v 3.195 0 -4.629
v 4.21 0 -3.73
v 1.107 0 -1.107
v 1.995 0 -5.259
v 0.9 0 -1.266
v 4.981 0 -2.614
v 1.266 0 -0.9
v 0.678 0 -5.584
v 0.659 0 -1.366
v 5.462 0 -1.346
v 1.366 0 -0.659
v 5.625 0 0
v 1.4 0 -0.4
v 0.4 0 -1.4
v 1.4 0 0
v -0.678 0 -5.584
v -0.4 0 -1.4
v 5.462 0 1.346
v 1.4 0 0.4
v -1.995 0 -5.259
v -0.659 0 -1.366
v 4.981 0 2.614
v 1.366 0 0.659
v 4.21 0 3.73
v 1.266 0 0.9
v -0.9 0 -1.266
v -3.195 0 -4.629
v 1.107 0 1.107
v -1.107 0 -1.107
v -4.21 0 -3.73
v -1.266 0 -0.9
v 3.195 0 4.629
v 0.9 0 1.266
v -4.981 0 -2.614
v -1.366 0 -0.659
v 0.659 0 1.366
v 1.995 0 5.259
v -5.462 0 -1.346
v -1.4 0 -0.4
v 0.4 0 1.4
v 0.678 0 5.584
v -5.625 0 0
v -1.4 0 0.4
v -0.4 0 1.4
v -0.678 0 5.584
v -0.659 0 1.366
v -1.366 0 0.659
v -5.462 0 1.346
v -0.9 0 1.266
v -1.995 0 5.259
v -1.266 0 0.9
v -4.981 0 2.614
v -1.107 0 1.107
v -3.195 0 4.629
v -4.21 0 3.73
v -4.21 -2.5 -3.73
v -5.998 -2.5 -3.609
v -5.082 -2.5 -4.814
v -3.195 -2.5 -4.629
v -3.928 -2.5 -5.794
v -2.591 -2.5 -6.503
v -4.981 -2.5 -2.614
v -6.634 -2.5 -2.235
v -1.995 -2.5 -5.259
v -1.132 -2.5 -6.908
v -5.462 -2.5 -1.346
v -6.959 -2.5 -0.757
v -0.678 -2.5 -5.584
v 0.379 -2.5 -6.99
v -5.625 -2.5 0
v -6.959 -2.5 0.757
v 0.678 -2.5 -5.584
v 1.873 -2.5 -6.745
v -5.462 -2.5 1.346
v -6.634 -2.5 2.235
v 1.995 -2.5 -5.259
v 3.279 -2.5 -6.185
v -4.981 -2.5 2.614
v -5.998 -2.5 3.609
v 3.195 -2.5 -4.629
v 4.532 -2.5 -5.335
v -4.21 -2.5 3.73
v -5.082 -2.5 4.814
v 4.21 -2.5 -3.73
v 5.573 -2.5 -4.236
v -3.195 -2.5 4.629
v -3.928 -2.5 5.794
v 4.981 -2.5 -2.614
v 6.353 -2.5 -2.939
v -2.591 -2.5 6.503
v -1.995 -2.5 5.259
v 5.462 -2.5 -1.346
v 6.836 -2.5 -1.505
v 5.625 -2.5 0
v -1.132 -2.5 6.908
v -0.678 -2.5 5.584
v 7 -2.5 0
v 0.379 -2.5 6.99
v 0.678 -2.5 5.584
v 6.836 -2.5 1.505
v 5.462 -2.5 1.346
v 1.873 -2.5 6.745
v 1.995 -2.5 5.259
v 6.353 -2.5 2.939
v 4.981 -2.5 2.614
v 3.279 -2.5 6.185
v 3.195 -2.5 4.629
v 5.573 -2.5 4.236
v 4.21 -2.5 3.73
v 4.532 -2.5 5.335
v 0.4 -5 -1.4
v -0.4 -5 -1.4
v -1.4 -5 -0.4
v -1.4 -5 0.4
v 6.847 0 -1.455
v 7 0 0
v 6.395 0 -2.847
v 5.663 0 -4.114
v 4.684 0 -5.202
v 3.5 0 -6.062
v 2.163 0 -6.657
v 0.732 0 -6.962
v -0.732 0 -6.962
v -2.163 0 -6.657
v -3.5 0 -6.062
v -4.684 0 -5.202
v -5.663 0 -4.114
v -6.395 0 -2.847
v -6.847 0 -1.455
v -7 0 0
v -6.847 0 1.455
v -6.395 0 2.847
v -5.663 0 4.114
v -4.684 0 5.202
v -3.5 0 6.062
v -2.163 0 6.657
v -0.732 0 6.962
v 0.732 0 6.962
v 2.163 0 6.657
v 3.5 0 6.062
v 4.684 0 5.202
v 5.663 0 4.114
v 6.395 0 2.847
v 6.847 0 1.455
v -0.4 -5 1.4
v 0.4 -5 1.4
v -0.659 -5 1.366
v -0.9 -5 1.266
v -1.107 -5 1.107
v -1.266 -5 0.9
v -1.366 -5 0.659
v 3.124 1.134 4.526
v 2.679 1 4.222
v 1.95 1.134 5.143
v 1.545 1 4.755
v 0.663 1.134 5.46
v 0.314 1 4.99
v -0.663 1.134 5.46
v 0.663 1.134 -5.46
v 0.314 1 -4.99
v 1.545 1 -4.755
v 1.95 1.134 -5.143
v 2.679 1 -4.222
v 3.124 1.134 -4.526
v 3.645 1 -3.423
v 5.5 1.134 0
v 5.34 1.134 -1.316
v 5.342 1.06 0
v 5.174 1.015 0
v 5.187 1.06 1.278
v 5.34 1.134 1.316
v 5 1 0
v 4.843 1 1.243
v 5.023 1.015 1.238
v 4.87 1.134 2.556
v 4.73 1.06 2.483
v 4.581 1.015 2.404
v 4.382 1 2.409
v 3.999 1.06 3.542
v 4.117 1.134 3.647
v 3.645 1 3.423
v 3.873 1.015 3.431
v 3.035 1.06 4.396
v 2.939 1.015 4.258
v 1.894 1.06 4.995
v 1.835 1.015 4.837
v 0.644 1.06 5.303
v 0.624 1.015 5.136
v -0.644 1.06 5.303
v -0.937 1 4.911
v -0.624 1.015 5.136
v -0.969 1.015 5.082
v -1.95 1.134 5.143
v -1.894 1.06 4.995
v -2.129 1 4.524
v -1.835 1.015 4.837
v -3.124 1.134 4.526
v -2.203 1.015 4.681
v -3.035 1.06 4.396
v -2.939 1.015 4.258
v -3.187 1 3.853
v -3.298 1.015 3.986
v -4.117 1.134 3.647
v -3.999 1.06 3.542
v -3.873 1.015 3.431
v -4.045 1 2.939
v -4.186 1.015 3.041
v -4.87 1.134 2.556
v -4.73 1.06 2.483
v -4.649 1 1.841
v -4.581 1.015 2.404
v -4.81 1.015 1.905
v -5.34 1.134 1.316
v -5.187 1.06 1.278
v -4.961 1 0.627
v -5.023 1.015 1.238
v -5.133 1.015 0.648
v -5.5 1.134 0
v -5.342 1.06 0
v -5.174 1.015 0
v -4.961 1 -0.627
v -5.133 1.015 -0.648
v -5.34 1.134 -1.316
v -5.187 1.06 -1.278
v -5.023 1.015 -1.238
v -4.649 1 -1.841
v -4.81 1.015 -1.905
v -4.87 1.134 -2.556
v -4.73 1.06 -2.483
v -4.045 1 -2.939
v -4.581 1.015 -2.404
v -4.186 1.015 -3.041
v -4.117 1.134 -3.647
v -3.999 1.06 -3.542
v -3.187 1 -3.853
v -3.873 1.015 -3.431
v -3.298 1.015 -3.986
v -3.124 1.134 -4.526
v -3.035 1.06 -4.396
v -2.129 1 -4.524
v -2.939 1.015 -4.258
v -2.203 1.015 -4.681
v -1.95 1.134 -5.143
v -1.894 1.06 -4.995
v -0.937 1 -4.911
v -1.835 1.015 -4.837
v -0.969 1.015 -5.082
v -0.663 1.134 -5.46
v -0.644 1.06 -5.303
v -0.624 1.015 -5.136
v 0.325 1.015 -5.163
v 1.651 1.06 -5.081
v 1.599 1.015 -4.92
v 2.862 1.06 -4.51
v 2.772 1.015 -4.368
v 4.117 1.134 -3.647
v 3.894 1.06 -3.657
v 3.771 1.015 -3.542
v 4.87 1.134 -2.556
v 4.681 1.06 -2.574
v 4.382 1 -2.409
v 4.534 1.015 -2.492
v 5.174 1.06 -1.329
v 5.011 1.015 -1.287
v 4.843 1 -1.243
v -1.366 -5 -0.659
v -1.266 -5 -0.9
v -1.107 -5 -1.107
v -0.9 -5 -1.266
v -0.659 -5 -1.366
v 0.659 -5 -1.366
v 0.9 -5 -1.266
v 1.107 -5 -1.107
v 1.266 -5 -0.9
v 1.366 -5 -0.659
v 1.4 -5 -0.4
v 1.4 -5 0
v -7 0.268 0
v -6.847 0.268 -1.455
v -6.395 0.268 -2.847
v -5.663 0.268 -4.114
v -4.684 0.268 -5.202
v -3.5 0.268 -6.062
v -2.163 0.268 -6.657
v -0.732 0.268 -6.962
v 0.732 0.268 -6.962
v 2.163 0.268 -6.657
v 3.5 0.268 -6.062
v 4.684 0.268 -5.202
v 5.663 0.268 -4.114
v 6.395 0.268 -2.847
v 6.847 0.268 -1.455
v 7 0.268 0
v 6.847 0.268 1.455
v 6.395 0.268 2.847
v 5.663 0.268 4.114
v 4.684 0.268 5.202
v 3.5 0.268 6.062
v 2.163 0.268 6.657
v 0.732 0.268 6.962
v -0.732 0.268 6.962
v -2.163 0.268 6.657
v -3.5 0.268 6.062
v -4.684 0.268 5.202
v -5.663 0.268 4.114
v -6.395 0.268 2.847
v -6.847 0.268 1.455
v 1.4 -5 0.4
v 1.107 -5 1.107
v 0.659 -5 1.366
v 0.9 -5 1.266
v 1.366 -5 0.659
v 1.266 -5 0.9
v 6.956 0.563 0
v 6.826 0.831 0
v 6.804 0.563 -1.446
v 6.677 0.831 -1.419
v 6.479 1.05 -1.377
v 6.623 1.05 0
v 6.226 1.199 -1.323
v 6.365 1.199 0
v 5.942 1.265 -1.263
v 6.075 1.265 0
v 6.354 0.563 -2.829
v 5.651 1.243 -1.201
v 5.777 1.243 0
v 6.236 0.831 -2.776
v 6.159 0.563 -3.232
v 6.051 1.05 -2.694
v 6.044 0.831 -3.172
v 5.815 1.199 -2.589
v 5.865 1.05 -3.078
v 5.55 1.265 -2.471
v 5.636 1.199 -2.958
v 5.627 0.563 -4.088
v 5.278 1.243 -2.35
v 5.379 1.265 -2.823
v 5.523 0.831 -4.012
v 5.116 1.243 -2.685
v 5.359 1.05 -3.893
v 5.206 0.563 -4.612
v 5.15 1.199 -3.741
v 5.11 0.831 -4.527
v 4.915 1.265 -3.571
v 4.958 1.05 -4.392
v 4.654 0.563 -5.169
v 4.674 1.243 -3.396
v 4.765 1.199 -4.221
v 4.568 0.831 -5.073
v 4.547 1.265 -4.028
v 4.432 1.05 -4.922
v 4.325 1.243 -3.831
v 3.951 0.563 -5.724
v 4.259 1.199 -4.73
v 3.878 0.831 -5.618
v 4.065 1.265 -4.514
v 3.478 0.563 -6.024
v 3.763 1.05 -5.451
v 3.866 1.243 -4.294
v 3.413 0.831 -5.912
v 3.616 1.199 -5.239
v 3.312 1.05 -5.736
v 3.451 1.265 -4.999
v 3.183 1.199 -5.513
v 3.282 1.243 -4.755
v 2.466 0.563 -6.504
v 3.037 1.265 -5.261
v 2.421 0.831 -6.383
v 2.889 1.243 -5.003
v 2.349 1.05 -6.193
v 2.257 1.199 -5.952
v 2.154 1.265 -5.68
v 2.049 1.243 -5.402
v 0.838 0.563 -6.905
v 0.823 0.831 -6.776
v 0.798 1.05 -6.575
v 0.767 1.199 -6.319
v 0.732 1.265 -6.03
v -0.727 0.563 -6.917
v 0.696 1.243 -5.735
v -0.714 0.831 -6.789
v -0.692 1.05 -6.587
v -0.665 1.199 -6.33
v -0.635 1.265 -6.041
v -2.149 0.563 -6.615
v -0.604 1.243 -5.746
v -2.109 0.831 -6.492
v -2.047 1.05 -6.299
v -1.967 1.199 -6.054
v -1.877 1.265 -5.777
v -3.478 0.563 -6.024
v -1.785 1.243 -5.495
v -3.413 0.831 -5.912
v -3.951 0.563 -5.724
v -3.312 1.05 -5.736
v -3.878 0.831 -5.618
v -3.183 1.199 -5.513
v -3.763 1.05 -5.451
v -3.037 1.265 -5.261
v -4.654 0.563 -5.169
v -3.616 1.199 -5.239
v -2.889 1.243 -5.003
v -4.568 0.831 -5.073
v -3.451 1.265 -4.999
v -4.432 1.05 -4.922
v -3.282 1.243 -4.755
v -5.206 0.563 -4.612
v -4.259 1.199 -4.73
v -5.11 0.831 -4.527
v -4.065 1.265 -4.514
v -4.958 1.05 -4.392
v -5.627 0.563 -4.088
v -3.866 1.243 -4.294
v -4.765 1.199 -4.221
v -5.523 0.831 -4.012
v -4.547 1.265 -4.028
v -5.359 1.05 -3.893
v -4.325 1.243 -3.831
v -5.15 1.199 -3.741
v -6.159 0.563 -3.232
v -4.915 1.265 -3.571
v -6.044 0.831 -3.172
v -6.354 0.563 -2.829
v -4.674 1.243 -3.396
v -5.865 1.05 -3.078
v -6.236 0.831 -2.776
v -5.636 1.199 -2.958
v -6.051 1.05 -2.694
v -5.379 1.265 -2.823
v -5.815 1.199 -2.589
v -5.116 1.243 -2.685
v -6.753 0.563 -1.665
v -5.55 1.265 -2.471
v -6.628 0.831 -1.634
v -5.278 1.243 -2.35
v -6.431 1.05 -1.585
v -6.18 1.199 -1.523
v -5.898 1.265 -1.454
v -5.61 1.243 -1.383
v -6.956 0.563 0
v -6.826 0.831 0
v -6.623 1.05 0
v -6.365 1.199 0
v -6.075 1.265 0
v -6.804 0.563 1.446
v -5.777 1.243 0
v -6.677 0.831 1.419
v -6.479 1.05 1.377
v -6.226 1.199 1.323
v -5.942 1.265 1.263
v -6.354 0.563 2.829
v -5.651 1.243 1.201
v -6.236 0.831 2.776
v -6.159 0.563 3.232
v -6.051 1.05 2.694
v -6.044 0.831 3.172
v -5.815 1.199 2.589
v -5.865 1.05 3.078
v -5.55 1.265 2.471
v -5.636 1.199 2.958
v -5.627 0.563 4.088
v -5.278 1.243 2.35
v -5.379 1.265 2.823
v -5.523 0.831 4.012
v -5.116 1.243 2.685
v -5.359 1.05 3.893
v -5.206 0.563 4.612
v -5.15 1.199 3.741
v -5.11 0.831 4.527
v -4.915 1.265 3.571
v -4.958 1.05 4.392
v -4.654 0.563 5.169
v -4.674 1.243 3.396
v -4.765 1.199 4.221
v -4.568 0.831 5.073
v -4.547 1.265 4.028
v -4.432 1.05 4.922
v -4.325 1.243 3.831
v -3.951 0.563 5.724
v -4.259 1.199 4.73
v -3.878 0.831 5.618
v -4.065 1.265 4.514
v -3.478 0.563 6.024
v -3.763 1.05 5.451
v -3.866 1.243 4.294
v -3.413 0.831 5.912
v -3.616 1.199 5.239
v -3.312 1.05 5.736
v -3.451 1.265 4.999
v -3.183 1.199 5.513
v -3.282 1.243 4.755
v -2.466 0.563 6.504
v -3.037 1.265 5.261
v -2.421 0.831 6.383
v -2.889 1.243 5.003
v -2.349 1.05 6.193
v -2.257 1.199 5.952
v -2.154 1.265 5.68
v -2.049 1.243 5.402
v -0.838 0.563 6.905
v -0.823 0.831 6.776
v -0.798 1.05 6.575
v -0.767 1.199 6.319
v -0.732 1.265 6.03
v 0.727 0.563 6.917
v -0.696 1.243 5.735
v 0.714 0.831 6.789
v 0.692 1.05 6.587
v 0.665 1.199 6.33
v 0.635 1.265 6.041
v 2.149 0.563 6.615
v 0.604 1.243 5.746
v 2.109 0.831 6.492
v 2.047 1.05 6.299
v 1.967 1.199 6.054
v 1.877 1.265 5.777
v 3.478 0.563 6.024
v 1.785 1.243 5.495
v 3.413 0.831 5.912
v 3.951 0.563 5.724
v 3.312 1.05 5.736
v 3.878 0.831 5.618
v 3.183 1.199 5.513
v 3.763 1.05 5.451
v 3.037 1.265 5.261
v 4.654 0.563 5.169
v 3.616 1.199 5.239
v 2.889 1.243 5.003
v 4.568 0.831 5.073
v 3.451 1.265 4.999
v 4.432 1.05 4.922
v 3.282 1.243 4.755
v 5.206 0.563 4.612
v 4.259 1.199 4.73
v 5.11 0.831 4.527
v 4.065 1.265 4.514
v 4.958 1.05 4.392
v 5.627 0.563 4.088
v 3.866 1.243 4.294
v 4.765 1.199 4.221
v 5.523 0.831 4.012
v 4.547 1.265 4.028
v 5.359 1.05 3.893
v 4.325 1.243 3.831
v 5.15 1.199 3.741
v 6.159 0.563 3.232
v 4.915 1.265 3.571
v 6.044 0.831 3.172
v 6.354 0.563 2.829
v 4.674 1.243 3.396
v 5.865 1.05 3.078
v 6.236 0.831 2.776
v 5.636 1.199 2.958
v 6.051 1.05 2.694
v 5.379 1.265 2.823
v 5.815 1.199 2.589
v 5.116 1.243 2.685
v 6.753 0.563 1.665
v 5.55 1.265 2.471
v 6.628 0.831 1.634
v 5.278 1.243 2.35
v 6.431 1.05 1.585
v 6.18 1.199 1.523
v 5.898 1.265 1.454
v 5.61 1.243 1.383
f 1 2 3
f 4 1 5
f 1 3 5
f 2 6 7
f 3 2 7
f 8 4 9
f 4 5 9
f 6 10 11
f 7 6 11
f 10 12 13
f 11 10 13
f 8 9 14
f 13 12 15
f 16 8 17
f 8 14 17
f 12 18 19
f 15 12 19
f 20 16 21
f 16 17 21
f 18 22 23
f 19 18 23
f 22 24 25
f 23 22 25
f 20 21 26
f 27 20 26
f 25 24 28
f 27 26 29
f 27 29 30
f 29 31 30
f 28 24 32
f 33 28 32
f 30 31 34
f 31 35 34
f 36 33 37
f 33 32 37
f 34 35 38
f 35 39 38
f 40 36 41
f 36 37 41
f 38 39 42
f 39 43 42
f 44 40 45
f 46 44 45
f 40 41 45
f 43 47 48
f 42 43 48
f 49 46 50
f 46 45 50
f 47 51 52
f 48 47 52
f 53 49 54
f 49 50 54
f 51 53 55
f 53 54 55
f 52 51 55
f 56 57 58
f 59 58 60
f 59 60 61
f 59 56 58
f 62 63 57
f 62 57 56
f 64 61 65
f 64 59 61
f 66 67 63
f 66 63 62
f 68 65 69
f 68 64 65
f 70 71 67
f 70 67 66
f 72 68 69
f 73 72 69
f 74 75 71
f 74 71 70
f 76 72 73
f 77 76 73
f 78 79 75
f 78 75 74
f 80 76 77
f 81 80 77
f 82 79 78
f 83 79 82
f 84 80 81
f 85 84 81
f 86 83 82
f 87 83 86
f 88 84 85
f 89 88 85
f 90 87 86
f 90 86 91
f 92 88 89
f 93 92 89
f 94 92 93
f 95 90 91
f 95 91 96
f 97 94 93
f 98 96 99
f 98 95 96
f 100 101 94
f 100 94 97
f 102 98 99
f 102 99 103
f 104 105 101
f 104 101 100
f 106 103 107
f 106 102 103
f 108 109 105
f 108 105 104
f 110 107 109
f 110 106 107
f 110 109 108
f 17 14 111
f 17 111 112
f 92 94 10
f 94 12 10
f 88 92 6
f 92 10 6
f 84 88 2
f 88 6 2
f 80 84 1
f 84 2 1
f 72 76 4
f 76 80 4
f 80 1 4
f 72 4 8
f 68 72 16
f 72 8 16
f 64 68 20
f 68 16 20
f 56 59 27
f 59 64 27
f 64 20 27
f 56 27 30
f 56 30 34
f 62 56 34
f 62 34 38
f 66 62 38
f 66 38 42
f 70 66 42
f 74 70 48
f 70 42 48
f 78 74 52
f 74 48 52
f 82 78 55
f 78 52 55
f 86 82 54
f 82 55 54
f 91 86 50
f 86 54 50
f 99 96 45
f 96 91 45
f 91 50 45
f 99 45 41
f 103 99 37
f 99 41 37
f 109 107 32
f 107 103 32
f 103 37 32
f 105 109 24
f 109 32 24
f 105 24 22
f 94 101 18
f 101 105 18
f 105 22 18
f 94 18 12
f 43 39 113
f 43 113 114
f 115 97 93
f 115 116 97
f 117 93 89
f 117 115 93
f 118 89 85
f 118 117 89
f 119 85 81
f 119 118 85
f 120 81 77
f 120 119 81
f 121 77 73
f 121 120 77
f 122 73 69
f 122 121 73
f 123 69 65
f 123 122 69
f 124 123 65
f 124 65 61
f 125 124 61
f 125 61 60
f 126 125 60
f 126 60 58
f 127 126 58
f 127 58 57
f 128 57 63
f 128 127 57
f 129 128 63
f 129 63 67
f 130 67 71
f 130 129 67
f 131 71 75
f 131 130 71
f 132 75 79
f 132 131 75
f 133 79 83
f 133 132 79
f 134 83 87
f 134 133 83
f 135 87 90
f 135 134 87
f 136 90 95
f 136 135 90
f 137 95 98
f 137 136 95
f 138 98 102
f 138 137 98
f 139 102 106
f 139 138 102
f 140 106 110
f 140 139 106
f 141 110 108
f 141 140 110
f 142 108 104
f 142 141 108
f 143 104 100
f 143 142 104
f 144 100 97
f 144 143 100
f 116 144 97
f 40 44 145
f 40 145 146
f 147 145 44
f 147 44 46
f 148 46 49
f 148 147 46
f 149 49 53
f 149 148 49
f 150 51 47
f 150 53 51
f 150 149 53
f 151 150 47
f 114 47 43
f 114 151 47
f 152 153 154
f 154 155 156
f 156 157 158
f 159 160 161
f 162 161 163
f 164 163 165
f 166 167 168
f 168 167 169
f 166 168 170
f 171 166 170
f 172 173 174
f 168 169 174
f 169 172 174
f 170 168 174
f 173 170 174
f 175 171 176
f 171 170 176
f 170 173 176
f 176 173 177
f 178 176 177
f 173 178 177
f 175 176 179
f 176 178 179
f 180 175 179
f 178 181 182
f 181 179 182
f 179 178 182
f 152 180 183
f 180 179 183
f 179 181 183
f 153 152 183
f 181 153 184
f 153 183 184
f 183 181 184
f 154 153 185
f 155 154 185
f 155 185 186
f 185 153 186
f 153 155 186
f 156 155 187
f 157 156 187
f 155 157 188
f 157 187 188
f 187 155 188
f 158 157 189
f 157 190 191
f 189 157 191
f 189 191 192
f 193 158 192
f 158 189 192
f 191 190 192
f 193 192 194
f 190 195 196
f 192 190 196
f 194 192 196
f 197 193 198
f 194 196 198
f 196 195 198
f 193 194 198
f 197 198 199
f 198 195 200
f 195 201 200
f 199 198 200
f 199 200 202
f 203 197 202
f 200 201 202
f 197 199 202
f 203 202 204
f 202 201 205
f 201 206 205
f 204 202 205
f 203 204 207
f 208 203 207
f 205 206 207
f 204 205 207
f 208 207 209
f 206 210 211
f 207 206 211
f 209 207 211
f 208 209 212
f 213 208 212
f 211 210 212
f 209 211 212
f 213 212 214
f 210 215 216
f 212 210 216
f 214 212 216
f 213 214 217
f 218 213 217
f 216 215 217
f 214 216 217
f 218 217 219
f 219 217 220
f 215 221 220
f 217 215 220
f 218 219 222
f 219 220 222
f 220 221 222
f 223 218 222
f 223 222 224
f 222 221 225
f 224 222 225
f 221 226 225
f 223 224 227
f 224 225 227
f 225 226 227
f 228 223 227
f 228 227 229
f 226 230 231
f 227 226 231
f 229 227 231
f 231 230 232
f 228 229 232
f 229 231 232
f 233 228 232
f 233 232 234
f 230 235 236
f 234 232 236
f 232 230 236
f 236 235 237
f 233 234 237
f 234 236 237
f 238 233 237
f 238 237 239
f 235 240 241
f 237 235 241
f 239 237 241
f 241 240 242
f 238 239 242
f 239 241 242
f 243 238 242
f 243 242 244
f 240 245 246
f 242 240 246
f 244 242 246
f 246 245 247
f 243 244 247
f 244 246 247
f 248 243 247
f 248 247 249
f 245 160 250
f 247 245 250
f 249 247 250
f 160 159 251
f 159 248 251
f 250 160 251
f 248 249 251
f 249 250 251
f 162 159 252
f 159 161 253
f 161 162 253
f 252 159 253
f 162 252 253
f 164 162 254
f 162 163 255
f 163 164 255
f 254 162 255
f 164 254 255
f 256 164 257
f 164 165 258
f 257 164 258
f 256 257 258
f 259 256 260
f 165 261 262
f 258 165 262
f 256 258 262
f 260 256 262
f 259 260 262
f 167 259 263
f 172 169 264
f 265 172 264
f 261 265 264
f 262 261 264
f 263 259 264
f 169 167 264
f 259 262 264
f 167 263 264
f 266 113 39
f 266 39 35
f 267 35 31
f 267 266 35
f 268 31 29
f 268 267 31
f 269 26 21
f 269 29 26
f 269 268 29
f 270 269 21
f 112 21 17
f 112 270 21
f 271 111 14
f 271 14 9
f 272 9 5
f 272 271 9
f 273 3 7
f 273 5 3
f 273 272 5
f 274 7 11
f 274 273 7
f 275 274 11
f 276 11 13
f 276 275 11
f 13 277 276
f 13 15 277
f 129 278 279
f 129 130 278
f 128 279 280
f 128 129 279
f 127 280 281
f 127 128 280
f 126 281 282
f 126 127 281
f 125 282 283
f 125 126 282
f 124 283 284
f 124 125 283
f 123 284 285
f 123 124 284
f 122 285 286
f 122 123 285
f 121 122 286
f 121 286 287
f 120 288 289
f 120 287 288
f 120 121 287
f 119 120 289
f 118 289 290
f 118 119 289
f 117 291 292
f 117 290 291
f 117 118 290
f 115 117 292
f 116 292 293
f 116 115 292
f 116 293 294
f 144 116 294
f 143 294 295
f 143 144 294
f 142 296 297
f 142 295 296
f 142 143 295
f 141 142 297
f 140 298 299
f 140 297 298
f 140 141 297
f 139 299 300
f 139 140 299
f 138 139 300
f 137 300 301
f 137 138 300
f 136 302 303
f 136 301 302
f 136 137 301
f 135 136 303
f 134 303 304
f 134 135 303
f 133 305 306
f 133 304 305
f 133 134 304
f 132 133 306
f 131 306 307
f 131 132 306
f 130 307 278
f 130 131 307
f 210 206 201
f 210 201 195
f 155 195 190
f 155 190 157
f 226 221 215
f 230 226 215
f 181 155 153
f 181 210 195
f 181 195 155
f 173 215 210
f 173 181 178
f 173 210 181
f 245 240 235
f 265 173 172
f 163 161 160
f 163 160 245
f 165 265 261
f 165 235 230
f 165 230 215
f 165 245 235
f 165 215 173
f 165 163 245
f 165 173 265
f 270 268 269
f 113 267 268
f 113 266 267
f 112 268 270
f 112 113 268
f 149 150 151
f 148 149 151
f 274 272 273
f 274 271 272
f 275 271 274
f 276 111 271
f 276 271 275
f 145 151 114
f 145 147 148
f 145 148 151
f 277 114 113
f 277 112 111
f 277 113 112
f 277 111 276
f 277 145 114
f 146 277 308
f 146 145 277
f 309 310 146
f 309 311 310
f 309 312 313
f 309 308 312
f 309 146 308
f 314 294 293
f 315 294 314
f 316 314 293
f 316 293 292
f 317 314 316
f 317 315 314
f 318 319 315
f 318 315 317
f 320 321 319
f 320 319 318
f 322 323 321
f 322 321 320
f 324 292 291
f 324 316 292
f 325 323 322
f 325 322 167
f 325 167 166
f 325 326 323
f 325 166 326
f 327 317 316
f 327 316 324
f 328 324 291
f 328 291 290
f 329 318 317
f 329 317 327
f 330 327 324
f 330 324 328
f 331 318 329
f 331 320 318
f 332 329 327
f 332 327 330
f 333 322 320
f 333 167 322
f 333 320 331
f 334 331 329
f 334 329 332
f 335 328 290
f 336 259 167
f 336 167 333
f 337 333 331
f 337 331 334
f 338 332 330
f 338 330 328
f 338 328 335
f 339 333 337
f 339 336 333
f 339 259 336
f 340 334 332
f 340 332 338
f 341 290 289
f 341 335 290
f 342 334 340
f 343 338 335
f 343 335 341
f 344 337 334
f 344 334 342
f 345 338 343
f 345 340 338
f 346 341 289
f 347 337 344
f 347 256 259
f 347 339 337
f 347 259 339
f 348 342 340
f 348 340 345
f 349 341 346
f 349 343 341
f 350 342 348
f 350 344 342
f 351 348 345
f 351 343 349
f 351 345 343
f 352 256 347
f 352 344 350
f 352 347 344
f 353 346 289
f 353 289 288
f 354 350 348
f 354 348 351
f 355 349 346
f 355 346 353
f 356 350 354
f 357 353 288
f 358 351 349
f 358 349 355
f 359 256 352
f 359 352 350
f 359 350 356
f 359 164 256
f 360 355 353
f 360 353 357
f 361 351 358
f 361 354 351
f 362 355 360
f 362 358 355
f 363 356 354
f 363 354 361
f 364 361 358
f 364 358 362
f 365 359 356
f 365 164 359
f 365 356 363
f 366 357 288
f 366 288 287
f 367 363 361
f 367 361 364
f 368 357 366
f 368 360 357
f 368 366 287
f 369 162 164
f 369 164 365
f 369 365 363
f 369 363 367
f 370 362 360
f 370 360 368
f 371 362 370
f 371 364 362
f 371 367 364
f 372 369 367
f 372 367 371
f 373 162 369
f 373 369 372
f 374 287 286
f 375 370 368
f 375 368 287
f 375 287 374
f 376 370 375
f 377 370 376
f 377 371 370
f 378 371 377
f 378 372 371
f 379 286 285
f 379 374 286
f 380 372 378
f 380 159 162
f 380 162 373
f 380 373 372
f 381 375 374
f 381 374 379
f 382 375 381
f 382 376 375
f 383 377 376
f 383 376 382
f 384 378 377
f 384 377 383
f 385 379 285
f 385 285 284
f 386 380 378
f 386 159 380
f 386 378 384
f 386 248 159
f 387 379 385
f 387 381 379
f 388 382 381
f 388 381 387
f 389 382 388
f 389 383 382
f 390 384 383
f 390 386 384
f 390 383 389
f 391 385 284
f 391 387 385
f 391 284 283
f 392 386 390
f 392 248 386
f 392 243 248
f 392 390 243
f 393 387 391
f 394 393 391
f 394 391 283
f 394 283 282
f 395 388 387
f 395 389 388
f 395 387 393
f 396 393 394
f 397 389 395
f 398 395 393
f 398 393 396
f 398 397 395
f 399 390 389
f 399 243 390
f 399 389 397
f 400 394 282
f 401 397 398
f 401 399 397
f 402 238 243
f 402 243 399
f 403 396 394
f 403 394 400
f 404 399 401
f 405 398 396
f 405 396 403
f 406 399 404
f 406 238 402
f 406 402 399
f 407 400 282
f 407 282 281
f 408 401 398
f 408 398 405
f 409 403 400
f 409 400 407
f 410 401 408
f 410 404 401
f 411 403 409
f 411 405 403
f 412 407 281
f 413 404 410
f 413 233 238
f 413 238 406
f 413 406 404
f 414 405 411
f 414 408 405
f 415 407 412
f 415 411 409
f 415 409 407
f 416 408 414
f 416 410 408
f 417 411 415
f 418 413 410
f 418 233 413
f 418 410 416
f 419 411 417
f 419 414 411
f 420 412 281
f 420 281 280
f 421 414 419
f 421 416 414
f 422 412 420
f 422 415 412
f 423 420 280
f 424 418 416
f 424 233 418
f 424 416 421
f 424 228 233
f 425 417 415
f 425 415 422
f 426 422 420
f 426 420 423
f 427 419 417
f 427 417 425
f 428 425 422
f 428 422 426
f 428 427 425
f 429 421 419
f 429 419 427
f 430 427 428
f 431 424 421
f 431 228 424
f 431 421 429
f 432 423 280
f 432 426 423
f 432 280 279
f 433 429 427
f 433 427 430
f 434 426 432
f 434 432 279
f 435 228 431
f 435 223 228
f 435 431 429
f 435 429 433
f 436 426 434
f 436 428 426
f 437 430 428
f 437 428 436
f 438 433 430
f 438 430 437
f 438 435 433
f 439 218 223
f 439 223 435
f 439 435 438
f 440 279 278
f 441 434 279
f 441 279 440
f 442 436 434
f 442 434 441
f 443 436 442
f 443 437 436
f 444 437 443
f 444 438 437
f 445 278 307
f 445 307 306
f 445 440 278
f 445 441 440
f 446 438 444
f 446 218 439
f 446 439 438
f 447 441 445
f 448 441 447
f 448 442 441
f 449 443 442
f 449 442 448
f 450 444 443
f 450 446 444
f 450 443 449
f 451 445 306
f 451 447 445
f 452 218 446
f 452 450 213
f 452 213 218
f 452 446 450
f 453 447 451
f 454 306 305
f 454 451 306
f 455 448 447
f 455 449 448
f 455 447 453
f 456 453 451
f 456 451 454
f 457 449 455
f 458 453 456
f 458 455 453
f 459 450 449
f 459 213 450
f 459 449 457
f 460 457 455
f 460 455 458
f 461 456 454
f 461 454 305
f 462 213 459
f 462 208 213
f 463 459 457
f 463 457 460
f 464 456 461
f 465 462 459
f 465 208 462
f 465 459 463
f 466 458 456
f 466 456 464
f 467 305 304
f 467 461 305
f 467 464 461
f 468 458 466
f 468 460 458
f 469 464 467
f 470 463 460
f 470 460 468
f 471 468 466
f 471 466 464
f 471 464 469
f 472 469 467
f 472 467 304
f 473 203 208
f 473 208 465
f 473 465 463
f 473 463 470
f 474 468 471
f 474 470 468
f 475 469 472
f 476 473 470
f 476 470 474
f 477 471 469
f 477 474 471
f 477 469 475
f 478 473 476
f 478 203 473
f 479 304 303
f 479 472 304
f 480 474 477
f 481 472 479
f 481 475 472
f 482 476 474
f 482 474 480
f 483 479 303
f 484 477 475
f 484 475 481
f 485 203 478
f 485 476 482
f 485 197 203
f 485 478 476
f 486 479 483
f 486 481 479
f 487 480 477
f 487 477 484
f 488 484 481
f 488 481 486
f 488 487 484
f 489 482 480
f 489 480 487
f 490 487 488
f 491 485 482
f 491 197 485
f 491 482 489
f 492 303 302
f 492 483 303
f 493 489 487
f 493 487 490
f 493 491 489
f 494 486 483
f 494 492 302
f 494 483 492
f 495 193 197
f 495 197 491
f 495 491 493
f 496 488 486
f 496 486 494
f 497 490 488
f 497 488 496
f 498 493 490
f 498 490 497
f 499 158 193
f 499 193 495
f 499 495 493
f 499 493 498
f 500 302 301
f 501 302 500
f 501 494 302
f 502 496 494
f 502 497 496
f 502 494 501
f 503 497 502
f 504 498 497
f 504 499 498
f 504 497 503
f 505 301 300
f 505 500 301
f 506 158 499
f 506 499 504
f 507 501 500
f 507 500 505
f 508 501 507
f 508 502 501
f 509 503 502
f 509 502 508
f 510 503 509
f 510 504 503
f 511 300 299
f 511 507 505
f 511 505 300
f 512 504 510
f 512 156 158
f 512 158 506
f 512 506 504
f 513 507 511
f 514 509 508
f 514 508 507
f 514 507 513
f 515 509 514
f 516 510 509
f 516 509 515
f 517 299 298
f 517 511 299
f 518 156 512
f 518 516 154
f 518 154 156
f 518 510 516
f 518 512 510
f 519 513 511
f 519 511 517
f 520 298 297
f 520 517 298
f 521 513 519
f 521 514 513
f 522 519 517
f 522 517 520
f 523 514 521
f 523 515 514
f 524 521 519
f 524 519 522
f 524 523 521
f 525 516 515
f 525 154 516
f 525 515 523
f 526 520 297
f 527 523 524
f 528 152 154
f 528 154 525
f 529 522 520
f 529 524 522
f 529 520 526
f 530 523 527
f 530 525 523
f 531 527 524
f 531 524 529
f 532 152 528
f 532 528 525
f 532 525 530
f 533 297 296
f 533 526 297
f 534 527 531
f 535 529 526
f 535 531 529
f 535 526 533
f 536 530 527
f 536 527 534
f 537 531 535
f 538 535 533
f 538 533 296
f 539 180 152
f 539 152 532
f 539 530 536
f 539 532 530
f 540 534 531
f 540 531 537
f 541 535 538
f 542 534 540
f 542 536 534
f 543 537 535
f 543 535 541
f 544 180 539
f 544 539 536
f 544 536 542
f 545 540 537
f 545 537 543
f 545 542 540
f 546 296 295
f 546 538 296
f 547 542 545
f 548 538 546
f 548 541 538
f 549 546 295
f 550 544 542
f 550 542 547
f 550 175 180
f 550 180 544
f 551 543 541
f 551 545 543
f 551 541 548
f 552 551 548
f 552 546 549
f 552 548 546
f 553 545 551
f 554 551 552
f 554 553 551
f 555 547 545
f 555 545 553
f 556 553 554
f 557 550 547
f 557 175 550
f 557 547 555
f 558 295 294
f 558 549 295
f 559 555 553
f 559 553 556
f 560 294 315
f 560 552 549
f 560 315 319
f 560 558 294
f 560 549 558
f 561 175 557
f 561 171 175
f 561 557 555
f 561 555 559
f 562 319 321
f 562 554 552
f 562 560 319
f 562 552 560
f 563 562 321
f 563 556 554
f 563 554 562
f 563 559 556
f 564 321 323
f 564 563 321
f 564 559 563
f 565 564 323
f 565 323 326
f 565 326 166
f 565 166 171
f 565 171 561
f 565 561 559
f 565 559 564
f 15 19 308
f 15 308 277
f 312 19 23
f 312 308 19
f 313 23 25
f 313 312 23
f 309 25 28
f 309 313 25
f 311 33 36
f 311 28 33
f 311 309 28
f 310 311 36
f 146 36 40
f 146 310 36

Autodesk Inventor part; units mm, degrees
ref_plane "YZ Plane" through (0, 0, 0) normal (1, 0, 0) x (0, 1, 0)
ref_plane "XZ Plane" through (0, 0, 0) normal (0, 1, 0) x (-1, 0, 0)
ref_plane "XY Plane" through (0, 0, 0) normal (0, 0, 1) x (1, 0, 0)
sketch "Boceto1" plane through (0, 0, 0) normal (0, 1, 0) x (-1, 0, 0)
  circle A0 centre (0, 0) radius 7
  dimension "d0" = 14
extrude "Extrusión1" add sketch "Boceto1" along normal blind 2
sketch "Boceto2" plane through (0, 0, 0) normal (0, -1, 0) x (1, 0, 0)
  circle A0 centre (0, 0) radius 5.625
  circle A1 centre (0, 0) radius 7
  dimension "d3" = 11.25
  dimension "d4" = 14
extrude "Extrusión2" add sketch "Boceto2" along normal blind 2.5
sketch "Boceto3" plane through (0, 0, 0) normal (0, -1, 0) x (1, 0, 0)
  line L0 (0, 0) -> (2.8, 0)
  line L1 (2.8, 0) -> (2.8, -1.4)
  line L2 (2.8, -1.4) -> (1.4, -1.4)
  line L3 (1.4, -1.4) -> (1.4, -2.8)
  line L4 (1.4, -2.8) -> (-1.4, -2.8)
  line L5 (-1.4, -2.8) -> (-1.4, -1.4)
  line L6 (-1.4, -1.4) -> (-2.8, -1.4)
  line L7 (-2.8, -1.4) -> (-2.8, 1.4)
  line L8 (-2.8, 1.4) -> (-1.4, 1.4)
  line L9 (-1.4, 1.4) -> (-1.4, 2.8)
  line L10 (-1.4, 2.8) -> (1.4, 2.8)
  line L11 (1.4, 2.8) -> (1.4, 1.4)
  line L12 (1.4, 1.4) -> (2.8, 1.4)
  line L13 (2.8, 1.4) -> (2.8, 0)
  line L14 (-1.4, 1.4) -> (1.4, 1.4)
  line L15 (1.4, 1.4) -> (1.4, -1.4)
  line L16 (1.4, -1.4) -> (-1.4, -1.4)
  line L17 (-1.4, -1.4) -> (-1.4, 1.4)
  line L18 (-1.4, 1.4) -> (1.4, 1.4)
  line L19 (1.4, 1.4) -> (1.4, -1.4)
  line L20 (1.4, -1.4) -> (-1.4, -1.4)
  line L21 (-1.4, -1.4) -> (-1.4, 1.4)
  dimension "d7" = 2.8
  dimension "d8" = 1.4
  dimension "d9" = 1.4
  dimension "d10" = 1.4
  dimension "d11" = 2.8
  dimension "d12" = 1.4
  dimension "d13" = 1.4
  dimension "d14" = 2.8
  dimension "d15" = 1.4
  dimension "d16" = 1.4
  dimension "d17" = 2.8
  dimension "d18" = 1.4
  dimension "d19" = 1.4
extrude "Extrusión3" add sketch "Boceto3" along normal blind 5 contours L15 L16 L17 L14
sketch "Boceto8" plane through (0, 2, 0) normal (0, 1, 0) x (1, 0, 0)
  circle A0 centre (0, 0) radius 6
  dimension "d55" = 12
extrude "Extrusión6" cut sketch "Boceto8" against normal blind 1
fillet "Empalme2" radius 1 3 edges at (-6, 1, 0) (-6, 2, 0) (7, 2, 0)
fillet "Empalme5" radius 1 4 edges at (1.4, -2.5, 1.4) (-1.4, -2.5, 1.4) (1.4, -2.5, -1.4) (-1.4, -2.5, -1.4)
properties part number "Boton Tapa"
